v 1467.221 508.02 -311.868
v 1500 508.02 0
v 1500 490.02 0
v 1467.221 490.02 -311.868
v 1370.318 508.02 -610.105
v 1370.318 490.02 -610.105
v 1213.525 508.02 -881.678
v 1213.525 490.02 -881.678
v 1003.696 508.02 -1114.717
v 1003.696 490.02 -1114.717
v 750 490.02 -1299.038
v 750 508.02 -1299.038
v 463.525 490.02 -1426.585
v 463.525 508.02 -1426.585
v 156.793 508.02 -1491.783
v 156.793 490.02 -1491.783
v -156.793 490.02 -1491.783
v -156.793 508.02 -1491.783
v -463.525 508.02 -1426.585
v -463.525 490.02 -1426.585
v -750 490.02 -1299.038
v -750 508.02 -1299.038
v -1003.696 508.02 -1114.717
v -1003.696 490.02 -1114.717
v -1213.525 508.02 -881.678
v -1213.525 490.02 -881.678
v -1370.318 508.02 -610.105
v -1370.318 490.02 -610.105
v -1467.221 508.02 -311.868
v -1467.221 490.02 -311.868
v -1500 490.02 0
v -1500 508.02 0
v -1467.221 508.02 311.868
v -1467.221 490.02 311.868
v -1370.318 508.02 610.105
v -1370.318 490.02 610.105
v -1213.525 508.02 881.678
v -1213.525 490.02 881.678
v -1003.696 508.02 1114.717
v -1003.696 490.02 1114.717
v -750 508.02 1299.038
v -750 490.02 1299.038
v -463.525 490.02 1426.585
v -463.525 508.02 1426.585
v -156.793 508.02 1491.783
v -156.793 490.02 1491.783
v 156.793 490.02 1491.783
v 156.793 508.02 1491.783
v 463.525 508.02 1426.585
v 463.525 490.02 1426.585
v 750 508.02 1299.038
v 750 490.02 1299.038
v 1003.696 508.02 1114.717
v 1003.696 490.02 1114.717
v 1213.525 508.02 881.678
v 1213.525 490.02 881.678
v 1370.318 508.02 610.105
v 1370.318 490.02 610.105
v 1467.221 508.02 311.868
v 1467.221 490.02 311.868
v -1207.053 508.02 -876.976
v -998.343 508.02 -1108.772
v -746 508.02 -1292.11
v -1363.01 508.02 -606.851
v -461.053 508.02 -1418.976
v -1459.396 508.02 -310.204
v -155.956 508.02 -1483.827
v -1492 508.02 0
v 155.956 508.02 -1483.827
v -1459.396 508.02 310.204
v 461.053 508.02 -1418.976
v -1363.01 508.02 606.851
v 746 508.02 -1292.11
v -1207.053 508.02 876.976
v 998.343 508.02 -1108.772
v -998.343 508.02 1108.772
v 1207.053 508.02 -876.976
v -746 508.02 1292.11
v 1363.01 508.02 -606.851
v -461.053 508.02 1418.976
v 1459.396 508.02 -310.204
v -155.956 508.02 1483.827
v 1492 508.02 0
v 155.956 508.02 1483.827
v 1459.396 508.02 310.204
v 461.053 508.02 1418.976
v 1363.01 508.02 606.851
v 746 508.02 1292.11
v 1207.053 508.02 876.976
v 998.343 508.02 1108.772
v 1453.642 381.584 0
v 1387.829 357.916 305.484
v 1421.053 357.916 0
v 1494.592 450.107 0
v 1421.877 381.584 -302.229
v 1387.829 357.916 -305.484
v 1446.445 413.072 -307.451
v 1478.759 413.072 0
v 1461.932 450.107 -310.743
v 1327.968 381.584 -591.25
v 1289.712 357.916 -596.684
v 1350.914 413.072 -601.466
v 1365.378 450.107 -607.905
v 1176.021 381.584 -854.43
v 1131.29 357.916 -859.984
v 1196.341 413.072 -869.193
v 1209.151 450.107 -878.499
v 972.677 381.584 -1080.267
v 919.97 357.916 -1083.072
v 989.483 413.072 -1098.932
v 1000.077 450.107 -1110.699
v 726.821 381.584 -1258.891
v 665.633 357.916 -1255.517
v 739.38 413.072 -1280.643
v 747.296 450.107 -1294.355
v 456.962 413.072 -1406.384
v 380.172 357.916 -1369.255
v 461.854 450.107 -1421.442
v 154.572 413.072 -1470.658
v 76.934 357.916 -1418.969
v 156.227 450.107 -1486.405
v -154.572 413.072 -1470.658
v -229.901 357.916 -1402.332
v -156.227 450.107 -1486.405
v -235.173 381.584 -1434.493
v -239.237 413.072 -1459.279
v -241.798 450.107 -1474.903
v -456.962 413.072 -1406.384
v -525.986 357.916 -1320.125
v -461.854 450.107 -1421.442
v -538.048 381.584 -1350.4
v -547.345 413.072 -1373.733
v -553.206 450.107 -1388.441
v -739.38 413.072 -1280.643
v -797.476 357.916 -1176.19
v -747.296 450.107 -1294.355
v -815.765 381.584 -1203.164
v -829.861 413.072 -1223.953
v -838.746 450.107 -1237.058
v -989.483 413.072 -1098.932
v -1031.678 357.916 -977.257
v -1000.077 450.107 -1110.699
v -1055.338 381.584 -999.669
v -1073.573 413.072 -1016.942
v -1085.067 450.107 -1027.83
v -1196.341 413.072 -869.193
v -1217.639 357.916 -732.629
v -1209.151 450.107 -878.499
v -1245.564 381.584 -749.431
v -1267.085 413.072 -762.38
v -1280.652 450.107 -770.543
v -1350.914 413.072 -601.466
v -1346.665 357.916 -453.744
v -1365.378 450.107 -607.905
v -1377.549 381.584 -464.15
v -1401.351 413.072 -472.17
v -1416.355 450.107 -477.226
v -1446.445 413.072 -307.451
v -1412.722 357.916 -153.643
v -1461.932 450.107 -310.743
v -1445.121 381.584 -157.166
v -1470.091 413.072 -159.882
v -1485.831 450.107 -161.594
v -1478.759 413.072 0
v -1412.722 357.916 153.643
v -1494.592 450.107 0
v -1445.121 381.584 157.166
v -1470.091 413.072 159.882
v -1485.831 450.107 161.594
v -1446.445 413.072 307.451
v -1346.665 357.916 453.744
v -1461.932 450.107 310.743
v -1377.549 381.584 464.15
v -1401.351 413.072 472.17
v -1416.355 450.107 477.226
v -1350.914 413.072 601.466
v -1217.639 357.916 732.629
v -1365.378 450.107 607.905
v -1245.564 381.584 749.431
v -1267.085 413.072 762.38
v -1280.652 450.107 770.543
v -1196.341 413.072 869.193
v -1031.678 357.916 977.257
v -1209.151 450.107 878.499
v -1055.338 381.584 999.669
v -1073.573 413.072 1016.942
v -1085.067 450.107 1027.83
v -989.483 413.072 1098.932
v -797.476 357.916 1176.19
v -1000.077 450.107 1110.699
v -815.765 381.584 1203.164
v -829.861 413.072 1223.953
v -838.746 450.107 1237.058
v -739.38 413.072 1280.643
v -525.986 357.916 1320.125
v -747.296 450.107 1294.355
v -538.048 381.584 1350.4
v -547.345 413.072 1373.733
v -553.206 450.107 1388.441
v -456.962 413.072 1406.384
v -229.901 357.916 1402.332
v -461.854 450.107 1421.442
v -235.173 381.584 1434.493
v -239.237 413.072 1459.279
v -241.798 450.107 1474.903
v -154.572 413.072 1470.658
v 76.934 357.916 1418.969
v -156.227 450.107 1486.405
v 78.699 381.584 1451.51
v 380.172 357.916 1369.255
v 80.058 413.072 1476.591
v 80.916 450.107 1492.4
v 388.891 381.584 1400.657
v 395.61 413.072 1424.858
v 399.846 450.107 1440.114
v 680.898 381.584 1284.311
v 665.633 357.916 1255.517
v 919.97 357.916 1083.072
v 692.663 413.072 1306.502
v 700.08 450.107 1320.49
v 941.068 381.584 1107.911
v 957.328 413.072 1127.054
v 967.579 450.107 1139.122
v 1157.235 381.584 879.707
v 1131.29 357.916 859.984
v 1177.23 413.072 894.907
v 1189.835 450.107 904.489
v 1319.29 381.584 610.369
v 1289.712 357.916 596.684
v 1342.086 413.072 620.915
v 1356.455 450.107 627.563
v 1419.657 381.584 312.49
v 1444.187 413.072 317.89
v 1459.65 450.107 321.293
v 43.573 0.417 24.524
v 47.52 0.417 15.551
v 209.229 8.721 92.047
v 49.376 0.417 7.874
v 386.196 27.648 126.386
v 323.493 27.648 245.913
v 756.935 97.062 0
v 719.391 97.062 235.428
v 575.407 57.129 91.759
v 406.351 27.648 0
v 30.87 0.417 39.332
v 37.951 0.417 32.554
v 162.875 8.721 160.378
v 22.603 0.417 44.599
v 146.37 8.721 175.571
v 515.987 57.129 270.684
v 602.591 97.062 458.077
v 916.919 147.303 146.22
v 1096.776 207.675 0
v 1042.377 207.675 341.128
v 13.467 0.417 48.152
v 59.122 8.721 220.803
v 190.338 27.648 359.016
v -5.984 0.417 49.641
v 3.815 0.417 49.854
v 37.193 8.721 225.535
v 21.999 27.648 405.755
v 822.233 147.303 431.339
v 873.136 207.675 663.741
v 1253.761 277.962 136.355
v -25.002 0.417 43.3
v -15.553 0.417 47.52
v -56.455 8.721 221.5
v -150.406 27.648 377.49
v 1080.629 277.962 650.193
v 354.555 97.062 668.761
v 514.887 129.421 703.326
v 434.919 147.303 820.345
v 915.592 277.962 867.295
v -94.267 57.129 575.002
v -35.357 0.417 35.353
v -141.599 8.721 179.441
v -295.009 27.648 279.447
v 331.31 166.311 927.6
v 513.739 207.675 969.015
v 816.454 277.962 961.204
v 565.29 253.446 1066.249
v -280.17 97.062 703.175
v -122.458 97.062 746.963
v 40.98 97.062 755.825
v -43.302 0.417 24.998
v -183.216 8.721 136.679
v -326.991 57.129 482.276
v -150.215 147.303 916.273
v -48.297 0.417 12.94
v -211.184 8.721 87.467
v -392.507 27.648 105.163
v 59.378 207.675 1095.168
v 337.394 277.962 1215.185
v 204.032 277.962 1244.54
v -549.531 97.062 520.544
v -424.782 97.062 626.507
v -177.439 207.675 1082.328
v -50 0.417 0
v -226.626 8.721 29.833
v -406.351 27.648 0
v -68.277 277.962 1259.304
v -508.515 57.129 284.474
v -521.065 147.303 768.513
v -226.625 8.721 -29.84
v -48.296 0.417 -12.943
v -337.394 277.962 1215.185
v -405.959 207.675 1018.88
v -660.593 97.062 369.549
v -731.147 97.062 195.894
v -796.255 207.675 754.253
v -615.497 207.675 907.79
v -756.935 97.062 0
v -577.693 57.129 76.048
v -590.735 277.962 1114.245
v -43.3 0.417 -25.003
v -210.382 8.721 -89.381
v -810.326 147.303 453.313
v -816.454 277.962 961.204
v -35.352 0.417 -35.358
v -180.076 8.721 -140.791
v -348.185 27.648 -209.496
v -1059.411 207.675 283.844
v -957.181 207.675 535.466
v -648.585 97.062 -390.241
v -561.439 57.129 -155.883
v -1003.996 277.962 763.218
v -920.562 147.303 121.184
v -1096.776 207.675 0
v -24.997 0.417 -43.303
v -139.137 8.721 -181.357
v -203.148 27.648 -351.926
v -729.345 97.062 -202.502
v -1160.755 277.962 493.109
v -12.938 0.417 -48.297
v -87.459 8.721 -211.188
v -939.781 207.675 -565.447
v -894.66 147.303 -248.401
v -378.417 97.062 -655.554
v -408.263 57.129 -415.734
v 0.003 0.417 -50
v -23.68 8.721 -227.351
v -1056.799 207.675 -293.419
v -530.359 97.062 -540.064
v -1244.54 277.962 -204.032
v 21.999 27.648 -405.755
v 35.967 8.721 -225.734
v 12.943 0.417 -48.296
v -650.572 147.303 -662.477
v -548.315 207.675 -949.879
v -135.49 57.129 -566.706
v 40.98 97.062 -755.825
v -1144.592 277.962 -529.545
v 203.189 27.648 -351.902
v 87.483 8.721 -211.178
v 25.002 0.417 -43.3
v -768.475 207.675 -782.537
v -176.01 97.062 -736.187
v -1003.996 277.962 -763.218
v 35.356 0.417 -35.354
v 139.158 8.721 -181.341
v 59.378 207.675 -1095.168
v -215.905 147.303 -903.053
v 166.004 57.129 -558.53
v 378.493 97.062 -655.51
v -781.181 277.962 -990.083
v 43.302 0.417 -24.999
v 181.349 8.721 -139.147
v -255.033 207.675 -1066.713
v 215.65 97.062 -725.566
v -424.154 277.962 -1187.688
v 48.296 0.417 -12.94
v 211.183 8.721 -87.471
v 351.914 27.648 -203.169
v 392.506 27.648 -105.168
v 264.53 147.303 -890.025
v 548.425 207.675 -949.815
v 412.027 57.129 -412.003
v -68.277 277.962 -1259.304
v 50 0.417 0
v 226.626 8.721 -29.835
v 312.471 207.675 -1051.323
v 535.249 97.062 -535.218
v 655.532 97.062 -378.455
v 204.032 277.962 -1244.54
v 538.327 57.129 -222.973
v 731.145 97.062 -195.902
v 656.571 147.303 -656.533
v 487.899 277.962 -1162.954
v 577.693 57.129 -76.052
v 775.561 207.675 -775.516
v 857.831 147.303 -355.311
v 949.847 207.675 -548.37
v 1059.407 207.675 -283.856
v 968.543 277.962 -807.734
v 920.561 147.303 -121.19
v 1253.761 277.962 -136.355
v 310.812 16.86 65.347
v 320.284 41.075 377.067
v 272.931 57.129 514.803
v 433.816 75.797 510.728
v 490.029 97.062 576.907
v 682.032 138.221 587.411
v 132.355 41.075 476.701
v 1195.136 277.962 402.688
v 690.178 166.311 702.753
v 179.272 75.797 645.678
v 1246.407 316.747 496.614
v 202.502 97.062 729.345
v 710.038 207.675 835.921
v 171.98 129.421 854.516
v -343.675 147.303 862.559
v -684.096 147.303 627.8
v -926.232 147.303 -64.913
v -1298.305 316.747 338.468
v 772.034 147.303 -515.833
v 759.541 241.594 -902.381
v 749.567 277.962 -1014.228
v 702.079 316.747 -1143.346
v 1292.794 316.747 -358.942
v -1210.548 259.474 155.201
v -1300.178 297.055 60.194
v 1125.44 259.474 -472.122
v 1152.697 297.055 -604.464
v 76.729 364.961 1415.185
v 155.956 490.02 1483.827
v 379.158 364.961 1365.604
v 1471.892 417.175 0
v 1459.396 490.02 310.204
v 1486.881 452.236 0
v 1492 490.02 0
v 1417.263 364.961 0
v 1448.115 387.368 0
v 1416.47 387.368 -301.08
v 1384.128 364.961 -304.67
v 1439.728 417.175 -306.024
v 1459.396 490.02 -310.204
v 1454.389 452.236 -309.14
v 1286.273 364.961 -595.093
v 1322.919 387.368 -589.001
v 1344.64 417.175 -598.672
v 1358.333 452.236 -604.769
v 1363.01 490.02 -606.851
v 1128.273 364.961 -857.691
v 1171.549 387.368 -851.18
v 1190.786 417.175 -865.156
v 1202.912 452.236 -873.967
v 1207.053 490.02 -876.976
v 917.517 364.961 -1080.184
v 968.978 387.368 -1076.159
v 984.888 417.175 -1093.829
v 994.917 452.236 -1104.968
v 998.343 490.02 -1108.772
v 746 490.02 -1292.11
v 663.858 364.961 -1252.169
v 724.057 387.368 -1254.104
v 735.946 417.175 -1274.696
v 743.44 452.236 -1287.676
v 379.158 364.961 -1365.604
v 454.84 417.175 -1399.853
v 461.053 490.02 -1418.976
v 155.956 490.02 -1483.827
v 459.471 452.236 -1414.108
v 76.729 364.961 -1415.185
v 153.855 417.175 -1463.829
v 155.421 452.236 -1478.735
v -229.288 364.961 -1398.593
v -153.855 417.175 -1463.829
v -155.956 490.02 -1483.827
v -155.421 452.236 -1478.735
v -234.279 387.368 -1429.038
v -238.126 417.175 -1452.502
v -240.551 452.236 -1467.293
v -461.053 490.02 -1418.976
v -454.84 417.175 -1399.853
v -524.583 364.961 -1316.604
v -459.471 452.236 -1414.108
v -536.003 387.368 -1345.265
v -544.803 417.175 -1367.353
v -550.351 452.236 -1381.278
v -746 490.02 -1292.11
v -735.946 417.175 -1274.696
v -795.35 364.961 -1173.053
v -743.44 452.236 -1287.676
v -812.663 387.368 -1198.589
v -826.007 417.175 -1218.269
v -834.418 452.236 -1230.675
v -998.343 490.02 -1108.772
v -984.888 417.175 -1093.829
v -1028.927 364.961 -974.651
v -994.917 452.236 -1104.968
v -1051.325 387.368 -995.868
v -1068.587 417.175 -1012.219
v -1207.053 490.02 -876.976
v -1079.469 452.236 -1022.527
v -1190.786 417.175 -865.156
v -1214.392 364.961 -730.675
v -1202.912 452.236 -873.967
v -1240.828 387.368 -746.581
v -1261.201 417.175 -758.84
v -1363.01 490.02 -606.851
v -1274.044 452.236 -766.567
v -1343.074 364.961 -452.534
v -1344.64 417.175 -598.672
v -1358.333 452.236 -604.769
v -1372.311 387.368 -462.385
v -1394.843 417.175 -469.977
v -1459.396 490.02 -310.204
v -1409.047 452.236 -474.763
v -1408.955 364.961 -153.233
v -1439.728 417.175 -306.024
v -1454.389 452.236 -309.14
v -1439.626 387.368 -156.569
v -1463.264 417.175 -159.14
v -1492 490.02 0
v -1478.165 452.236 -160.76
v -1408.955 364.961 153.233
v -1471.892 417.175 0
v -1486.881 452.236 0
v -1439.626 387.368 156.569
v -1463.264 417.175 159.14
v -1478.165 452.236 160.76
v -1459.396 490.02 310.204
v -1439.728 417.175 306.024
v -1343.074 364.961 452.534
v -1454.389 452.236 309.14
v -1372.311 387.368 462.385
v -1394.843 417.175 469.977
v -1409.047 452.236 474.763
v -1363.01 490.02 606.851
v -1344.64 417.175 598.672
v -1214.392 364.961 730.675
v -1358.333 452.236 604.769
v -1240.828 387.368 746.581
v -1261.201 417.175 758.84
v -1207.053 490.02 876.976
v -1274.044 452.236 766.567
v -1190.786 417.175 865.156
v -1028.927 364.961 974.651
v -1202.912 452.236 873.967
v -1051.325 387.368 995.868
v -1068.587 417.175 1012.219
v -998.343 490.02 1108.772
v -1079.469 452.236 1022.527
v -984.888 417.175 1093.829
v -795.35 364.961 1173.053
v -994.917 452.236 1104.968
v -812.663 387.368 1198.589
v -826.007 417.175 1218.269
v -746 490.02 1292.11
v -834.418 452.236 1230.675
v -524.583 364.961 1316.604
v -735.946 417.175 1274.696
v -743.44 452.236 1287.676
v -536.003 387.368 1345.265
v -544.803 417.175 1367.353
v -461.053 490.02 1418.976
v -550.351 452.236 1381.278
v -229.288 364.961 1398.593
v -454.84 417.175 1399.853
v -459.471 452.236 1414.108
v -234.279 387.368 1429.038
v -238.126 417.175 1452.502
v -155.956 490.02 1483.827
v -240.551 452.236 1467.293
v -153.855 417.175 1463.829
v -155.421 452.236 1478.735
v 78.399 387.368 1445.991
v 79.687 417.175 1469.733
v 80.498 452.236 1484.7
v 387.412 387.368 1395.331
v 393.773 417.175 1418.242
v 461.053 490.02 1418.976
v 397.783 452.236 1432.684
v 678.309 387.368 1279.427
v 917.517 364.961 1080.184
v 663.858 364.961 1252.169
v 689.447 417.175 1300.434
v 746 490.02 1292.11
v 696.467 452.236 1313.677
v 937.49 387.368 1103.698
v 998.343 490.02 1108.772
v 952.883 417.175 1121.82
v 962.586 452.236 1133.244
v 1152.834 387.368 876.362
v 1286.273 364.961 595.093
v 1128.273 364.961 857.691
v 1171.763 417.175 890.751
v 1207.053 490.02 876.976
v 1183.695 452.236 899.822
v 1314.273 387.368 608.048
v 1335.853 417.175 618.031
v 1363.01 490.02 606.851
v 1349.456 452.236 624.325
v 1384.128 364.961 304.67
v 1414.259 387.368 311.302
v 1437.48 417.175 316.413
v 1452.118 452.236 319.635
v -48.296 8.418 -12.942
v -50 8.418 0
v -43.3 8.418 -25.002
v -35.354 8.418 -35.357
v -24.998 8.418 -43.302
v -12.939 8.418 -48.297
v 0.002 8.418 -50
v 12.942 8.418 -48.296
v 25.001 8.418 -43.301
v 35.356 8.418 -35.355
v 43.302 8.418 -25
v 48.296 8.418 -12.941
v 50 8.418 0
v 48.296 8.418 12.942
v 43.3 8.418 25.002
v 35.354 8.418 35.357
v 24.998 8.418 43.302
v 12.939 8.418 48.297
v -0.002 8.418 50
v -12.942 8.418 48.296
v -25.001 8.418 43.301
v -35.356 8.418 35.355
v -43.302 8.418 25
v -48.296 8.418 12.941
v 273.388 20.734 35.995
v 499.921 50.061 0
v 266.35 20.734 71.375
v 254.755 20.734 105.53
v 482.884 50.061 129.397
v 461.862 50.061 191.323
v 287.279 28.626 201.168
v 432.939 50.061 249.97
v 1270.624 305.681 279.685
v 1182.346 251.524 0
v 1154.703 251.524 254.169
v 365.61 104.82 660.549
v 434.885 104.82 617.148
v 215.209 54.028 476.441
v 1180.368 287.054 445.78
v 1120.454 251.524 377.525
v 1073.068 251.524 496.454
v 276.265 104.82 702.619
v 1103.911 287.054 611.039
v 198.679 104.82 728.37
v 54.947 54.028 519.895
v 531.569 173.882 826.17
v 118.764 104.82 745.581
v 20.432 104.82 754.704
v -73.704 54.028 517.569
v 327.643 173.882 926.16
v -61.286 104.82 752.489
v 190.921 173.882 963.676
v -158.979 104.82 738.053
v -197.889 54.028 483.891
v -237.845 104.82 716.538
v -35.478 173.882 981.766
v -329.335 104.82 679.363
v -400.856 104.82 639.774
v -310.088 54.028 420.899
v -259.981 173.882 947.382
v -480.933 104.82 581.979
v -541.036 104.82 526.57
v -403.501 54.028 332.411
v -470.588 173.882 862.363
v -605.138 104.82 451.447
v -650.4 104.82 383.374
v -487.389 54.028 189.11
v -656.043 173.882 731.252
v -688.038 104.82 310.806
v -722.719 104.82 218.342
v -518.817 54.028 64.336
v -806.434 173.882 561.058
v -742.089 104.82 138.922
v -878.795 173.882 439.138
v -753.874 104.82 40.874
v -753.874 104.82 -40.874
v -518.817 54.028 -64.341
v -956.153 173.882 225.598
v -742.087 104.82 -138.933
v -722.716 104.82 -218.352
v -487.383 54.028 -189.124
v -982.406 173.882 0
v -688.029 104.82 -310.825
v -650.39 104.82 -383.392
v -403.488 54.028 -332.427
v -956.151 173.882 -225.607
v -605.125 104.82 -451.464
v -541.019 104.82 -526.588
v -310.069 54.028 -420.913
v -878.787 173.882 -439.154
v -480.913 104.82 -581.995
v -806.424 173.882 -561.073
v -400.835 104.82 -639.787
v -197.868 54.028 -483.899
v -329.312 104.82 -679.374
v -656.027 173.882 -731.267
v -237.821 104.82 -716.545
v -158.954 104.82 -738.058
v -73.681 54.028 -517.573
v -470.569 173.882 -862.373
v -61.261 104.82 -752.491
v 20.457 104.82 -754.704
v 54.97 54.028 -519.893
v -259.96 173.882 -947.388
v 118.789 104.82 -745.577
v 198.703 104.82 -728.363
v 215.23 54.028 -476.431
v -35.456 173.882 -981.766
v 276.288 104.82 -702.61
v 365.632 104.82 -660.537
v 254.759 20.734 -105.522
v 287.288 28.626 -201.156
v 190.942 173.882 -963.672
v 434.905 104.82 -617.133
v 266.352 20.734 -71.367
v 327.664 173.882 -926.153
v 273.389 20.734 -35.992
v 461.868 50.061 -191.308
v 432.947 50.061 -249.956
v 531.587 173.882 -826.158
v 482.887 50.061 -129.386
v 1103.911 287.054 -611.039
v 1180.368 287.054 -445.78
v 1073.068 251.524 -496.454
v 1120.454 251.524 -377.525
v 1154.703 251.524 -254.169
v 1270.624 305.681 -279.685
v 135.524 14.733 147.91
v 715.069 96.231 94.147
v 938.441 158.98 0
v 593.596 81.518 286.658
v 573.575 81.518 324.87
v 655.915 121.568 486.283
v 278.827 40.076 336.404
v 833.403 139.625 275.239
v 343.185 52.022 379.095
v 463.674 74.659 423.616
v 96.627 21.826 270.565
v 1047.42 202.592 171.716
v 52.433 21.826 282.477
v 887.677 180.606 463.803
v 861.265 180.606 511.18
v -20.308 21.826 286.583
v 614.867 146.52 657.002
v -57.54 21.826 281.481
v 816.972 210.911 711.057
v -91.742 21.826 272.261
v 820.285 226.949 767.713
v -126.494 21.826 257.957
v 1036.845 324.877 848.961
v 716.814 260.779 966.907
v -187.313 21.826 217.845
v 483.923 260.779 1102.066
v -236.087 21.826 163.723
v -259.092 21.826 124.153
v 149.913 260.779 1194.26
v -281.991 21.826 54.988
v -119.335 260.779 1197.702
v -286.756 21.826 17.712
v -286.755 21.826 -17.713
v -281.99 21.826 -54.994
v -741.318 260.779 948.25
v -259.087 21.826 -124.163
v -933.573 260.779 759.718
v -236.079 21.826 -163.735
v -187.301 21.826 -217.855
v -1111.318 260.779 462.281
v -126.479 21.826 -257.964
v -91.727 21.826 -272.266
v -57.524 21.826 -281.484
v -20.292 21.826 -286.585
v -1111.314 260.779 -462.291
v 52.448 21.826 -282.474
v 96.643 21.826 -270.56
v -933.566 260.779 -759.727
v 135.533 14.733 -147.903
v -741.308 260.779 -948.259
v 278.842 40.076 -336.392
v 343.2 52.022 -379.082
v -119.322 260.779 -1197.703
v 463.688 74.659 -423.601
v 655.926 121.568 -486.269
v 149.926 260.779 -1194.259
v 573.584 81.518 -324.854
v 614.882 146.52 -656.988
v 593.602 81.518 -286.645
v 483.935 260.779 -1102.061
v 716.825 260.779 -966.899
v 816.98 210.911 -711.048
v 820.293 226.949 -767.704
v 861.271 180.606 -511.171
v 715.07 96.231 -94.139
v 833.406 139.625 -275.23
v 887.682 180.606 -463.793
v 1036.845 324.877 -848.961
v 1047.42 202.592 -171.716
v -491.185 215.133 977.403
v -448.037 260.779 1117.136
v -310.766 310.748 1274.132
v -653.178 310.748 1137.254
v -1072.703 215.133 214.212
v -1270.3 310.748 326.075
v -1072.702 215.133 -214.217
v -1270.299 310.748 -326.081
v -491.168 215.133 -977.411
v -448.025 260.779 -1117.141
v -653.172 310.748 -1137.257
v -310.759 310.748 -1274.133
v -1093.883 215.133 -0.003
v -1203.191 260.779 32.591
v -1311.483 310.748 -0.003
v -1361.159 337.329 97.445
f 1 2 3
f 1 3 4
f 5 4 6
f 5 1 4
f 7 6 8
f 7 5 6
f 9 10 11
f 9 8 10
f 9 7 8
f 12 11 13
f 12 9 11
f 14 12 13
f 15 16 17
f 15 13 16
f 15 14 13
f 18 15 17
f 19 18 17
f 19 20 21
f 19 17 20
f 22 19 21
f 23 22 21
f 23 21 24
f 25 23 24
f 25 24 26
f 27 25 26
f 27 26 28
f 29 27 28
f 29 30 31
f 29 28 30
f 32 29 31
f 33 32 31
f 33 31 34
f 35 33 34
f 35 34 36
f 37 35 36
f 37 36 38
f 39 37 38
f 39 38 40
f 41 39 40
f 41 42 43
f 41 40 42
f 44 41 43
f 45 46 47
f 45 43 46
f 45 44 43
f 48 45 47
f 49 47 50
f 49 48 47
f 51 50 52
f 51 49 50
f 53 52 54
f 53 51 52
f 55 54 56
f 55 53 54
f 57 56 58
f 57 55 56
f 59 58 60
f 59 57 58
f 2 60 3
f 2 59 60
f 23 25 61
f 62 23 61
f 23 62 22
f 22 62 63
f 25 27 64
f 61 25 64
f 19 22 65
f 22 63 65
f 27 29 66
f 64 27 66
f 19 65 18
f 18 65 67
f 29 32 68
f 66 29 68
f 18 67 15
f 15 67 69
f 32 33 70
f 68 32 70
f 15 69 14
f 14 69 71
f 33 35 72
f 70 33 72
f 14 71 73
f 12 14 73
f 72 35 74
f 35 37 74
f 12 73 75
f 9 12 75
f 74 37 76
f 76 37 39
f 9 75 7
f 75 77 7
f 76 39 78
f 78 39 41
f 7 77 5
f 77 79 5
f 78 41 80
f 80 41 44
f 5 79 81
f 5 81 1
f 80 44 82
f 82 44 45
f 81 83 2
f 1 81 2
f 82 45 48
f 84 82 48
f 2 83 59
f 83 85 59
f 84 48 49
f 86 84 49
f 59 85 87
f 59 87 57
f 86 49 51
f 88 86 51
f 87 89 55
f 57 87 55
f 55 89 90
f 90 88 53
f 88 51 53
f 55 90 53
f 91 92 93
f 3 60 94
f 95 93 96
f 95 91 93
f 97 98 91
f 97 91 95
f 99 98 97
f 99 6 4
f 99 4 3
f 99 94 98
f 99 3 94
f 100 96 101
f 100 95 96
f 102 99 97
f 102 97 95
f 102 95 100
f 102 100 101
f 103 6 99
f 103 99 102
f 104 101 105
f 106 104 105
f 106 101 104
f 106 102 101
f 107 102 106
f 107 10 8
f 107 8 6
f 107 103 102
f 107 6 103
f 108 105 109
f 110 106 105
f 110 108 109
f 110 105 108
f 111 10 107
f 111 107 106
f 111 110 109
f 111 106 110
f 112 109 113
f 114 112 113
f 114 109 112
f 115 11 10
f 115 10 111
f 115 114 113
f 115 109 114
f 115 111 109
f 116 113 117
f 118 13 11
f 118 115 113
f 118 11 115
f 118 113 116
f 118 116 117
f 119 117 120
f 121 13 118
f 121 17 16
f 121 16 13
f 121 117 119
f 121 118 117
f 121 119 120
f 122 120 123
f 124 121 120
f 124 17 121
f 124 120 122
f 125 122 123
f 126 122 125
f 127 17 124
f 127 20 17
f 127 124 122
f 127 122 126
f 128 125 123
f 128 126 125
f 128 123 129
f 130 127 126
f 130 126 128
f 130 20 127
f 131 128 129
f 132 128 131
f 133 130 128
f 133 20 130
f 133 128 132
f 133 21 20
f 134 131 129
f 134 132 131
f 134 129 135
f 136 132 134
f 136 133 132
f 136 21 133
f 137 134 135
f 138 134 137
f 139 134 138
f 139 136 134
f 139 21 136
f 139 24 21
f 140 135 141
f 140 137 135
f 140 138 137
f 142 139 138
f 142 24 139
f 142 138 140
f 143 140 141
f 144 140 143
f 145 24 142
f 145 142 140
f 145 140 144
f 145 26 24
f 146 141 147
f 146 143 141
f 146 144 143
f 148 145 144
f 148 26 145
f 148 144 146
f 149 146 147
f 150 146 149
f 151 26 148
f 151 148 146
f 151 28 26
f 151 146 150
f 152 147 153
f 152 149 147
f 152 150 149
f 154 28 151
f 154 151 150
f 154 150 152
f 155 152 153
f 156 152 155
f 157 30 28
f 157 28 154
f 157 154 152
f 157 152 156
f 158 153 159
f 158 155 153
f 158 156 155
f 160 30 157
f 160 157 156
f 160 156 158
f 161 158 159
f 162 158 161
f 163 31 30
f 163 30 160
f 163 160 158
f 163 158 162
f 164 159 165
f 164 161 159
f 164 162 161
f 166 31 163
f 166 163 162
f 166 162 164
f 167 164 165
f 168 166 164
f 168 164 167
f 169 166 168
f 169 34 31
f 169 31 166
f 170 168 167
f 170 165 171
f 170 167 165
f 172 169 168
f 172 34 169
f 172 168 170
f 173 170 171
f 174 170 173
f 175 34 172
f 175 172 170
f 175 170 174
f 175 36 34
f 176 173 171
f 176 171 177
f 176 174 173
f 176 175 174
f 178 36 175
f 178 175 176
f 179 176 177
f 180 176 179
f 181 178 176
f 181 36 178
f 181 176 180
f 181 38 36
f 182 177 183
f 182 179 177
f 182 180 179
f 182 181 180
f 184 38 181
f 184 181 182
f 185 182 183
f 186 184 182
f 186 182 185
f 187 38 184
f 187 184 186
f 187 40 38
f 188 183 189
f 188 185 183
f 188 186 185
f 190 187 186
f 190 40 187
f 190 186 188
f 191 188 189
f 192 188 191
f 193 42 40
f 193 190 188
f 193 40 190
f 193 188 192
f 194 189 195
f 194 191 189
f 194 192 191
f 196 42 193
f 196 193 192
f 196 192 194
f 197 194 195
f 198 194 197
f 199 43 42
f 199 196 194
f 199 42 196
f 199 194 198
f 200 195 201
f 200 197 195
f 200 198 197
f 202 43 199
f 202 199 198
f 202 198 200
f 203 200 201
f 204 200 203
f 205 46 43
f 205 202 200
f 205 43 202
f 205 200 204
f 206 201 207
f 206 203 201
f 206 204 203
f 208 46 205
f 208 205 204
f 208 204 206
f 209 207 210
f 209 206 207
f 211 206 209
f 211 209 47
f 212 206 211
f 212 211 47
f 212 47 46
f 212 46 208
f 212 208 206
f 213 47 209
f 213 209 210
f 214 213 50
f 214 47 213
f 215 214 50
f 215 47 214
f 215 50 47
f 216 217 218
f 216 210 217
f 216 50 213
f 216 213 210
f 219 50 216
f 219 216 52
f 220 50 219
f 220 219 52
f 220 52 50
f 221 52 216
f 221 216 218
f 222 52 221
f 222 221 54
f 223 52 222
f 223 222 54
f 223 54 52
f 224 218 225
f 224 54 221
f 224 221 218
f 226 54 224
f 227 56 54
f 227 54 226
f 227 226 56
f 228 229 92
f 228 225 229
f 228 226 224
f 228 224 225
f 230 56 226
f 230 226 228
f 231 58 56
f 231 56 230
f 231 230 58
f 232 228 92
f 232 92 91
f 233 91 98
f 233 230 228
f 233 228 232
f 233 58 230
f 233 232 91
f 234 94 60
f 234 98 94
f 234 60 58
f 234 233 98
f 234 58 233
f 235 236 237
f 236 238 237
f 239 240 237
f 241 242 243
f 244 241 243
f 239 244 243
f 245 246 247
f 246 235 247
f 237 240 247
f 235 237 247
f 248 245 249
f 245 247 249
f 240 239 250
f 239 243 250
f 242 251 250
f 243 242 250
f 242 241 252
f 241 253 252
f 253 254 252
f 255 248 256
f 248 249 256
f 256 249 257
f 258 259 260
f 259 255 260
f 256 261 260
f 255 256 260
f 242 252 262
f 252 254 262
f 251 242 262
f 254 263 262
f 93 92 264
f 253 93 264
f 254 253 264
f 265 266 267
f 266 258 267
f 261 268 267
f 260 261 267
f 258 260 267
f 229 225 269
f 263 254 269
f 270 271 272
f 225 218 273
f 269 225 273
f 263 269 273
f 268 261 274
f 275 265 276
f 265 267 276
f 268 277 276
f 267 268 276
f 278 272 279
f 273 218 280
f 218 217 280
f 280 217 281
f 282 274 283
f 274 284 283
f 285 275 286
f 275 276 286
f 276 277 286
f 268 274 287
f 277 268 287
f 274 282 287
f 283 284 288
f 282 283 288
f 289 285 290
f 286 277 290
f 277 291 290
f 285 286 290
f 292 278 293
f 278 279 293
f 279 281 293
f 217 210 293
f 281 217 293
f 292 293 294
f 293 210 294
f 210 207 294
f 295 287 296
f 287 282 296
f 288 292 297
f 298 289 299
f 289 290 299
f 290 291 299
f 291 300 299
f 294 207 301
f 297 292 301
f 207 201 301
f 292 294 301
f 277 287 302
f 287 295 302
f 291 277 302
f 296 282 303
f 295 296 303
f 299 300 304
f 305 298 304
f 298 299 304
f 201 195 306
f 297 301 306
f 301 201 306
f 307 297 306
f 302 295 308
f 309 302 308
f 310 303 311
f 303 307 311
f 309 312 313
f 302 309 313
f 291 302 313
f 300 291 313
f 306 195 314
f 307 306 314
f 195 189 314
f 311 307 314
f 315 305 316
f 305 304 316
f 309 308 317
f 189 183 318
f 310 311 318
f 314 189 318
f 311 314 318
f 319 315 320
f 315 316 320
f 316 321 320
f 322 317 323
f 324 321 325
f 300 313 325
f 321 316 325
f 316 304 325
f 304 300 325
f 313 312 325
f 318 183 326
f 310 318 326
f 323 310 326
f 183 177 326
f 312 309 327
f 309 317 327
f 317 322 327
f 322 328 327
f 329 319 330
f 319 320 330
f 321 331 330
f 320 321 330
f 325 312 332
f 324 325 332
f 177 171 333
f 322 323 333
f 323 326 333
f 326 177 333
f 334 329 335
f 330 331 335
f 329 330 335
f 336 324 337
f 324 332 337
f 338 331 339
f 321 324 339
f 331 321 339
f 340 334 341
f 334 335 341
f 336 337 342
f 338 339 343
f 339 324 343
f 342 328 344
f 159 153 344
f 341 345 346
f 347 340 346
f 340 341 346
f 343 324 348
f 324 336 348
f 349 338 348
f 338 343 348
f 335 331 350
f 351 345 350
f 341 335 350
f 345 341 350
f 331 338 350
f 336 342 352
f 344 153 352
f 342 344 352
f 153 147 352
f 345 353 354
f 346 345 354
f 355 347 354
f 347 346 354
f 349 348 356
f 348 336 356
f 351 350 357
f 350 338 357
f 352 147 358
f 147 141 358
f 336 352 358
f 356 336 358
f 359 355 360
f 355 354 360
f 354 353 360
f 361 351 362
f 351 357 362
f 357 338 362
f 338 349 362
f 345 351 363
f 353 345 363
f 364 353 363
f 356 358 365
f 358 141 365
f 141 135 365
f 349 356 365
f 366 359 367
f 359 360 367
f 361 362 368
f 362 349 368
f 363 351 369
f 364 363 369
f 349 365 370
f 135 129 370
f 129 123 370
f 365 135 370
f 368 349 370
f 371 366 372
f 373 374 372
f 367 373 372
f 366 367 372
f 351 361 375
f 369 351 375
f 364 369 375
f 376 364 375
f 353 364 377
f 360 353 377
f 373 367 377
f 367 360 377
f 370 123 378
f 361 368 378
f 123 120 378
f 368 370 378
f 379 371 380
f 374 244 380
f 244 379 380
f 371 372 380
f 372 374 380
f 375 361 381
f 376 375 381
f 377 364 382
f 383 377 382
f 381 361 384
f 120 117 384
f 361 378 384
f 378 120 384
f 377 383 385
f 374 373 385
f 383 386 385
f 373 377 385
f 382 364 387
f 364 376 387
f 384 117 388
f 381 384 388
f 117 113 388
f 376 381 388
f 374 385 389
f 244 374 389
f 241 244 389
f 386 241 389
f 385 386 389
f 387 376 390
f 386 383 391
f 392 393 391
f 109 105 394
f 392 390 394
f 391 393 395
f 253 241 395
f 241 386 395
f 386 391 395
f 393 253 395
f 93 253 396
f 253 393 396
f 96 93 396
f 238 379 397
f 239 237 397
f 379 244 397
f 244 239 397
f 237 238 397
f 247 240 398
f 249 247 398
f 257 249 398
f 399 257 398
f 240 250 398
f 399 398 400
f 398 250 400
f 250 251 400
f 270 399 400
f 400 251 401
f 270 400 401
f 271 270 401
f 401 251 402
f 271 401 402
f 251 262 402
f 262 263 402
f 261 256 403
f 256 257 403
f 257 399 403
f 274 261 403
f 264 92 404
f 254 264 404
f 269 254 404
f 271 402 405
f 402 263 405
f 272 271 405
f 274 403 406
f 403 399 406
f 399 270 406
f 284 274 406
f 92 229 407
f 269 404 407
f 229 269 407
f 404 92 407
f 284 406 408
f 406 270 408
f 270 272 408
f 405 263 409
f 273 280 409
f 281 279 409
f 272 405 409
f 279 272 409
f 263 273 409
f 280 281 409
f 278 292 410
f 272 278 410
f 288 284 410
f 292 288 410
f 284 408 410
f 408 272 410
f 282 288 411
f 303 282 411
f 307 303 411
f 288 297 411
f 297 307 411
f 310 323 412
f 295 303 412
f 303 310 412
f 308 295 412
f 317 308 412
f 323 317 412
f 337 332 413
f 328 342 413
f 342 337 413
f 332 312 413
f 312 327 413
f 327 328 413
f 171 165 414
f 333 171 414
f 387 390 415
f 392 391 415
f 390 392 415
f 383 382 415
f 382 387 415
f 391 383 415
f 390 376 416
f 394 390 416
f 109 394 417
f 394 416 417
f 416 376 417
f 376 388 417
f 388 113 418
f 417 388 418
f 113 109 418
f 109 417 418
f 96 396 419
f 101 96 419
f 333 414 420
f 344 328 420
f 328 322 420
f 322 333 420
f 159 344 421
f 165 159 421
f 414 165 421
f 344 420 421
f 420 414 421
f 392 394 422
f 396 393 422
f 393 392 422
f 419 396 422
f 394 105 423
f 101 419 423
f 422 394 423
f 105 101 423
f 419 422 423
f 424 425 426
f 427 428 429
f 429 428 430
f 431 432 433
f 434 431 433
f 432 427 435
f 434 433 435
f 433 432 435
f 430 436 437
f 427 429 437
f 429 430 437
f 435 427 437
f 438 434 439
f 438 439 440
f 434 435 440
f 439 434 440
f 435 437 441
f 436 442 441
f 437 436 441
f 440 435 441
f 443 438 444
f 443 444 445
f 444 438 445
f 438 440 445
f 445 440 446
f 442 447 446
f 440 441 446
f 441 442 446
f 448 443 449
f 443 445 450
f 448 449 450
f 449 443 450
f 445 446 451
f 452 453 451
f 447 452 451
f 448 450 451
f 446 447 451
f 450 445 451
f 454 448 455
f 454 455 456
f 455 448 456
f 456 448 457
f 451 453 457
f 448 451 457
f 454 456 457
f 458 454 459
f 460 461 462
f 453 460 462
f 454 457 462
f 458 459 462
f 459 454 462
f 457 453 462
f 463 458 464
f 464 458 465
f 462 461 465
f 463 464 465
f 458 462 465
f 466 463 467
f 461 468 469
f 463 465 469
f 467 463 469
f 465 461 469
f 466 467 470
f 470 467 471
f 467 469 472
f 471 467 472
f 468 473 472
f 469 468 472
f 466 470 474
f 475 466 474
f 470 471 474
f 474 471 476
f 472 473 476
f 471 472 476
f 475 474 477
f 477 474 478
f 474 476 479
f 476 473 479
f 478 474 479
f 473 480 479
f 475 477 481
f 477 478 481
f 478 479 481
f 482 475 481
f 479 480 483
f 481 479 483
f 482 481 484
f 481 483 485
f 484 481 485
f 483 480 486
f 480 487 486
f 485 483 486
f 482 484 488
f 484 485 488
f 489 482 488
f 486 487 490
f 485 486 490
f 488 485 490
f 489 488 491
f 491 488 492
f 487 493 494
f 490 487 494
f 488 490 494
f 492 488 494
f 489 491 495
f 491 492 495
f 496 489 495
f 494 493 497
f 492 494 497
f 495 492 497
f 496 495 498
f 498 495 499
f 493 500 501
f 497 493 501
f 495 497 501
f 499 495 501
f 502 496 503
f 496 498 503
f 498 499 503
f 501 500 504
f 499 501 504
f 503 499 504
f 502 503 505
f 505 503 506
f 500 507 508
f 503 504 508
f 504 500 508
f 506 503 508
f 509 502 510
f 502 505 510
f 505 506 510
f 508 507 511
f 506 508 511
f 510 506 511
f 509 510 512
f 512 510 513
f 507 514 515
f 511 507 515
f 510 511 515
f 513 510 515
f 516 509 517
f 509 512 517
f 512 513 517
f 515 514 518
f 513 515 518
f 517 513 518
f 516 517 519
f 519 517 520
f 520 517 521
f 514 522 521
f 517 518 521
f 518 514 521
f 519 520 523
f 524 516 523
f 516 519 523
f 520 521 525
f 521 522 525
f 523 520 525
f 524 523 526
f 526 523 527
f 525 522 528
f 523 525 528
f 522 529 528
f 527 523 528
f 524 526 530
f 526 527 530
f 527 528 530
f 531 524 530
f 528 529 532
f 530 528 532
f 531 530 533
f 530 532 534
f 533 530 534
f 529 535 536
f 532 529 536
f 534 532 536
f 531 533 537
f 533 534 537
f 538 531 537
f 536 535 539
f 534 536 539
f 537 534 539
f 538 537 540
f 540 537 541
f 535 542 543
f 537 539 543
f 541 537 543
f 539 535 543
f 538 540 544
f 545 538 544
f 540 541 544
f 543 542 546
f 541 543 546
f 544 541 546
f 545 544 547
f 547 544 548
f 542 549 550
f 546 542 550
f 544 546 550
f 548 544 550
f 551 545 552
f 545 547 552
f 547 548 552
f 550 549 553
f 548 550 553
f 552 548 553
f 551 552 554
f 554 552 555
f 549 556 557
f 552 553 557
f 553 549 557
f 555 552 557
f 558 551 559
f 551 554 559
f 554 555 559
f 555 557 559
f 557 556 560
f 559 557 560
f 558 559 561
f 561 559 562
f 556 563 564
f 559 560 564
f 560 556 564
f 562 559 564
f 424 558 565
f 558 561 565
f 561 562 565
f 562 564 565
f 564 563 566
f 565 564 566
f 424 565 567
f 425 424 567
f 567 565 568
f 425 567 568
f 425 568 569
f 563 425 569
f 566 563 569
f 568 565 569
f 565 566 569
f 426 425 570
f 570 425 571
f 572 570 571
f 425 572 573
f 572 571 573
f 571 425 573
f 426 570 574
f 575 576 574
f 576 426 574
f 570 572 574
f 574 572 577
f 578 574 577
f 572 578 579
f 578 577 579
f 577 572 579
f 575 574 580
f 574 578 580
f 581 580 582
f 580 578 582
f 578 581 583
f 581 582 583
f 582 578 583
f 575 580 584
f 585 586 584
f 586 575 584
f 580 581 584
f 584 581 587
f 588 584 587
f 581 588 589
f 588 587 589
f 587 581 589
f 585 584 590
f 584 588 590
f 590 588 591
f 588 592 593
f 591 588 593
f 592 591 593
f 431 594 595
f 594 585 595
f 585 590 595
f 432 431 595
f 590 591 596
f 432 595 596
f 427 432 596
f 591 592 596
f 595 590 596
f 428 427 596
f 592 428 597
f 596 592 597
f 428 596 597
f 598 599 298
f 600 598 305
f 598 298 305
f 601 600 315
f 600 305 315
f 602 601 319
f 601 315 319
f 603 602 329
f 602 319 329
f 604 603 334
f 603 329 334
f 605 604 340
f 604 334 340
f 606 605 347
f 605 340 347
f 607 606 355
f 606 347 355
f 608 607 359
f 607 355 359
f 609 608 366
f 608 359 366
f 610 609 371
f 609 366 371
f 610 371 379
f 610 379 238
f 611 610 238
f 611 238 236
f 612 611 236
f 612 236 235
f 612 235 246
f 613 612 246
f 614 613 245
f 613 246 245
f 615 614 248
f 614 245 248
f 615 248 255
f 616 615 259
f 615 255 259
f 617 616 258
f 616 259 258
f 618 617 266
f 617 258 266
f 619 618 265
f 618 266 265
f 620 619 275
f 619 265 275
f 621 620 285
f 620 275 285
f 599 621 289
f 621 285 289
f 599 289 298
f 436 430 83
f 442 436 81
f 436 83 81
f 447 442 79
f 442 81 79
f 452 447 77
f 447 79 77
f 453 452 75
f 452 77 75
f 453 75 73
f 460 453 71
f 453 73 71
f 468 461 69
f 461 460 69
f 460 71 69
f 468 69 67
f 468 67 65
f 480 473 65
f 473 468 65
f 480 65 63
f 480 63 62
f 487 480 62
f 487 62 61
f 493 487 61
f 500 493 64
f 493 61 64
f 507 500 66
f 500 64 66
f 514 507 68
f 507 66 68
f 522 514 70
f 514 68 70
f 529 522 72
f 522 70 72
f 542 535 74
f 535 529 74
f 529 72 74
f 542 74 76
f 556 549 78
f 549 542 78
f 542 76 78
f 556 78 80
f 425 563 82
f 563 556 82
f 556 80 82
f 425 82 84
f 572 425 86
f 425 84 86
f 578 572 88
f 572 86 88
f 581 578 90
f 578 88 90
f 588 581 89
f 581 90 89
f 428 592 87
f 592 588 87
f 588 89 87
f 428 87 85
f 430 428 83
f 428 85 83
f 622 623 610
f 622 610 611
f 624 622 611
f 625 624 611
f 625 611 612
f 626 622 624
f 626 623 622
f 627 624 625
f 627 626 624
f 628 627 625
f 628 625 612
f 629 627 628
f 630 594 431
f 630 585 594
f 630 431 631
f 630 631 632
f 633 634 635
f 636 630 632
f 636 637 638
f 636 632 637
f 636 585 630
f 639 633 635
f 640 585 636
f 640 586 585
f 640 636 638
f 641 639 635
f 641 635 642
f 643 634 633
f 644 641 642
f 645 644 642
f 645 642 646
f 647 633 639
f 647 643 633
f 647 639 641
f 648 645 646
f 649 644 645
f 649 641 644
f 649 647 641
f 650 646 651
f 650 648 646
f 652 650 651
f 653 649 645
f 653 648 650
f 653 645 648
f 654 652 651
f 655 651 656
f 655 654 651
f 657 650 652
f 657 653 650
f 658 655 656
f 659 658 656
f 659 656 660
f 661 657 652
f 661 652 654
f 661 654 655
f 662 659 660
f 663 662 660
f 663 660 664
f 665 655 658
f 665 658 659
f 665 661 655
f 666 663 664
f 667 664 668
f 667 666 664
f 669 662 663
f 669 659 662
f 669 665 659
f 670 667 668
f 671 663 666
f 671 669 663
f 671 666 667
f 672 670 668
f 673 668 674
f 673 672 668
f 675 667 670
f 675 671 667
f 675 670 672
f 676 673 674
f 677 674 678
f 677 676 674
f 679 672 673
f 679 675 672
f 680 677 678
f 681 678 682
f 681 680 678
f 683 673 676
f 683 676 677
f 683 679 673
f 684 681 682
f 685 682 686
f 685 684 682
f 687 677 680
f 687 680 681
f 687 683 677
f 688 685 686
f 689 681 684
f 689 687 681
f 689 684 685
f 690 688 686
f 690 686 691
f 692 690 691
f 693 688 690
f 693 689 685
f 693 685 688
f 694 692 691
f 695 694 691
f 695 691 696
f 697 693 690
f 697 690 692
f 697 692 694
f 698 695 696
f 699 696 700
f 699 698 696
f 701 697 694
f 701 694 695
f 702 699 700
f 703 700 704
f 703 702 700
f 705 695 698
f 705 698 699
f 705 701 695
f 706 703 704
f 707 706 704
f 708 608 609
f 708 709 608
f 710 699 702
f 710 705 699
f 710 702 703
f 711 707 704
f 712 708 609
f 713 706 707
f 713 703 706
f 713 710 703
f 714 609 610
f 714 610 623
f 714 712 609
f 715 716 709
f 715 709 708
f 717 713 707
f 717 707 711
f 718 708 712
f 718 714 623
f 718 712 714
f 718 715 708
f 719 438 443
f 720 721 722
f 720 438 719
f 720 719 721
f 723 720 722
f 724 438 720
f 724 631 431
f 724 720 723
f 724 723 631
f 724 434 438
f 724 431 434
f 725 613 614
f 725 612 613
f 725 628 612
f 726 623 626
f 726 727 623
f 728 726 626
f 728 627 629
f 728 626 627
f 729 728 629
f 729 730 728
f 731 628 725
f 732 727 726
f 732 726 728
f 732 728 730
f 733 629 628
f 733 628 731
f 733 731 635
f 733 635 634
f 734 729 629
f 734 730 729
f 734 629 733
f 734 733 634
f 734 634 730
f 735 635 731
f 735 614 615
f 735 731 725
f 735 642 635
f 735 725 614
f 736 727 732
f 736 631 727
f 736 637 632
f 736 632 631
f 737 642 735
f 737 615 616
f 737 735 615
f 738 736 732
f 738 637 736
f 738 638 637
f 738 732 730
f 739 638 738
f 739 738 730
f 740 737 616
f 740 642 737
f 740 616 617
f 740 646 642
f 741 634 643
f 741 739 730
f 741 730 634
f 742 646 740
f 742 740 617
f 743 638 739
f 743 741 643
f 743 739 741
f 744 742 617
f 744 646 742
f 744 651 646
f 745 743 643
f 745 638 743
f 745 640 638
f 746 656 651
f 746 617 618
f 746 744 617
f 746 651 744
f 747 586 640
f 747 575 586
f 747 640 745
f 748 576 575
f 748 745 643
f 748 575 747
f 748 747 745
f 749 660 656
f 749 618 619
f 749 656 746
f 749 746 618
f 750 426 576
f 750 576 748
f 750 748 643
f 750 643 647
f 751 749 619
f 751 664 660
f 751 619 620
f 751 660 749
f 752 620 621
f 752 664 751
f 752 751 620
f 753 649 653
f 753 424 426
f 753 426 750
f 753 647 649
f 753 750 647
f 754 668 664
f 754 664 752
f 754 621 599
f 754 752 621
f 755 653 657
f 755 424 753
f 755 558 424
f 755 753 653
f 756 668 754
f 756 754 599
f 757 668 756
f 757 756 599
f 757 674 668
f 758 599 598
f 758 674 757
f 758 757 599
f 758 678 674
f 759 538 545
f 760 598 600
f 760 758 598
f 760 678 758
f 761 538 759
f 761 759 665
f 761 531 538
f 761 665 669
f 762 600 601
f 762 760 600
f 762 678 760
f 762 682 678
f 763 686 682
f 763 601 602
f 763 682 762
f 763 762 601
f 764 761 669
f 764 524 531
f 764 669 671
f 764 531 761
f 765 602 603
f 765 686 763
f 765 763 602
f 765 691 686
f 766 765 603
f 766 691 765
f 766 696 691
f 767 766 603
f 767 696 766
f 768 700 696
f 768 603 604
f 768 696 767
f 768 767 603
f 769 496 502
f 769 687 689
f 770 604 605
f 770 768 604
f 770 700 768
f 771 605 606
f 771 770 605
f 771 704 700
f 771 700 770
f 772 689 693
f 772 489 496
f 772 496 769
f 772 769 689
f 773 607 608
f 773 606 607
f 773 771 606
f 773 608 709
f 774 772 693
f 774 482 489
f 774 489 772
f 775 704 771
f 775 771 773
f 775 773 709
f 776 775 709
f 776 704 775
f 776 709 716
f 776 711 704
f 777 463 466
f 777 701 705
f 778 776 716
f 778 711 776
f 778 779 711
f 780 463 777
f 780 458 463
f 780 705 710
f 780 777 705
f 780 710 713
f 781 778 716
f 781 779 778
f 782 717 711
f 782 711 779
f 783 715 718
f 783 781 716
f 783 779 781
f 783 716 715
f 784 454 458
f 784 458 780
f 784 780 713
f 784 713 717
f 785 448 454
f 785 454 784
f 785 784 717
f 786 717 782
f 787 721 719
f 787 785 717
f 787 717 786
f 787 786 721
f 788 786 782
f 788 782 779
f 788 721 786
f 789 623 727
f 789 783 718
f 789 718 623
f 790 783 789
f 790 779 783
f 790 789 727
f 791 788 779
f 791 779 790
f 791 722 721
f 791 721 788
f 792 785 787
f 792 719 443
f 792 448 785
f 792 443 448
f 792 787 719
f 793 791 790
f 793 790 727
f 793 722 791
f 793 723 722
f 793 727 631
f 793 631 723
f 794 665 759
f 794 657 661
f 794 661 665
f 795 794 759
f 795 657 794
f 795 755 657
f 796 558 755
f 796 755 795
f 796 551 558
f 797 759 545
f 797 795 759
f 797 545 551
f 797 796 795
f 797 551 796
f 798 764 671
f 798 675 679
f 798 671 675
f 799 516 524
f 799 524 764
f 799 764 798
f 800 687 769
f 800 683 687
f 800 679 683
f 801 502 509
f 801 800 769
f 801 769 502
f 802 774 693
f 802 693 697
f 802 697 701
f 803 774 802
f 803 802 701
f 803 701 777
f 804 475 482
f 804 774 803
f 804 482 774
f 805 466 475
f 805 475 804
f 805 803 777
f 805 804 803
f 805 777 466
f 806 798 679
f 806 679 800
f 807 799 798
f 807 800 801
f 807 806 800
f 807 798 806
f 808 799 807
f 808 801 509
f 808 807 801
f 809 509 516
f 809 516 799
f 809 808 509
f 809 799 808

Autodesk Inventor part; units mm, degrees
ref_plane "YZ Plane" through (0, 0, 0) normal (1, 0, 0) x (0, 1, 0)
ref_plane "XZ Plane" through (0, 0, 0) normal (0, 1, 0) x (-1, 0, 0)
ref_plane "XY Plane" through (0, 0, 0) normal (0, 0, 1) x (1, 0, 0)
sketch "Sketch1" plane through (0, 0, 0) normal (0, 0, 1) x (1, 0, 0)
  line L0 (-1421.0526, 357.9157) -> (1421.0526, 357.9157) construction
  arc A0 (-1421.0526, 357.9157) -> (0, 0) centre (0, 3000) ccw construction
  line L1 (-1500, 490.0199) -> (1500, 490.0199) construction
  arc A1 (-1500, 490.0199) -> (-1421.0526, 357.9157) centre (-1350, 490.0199) ccw construction
  arc A2 (1421.0526, 357.9157) -> (1500, 490.0199) centre (1350, 490.0199) ccw
  line L2 (-1500, 490.0199) -> (-1500, 508.0199)
  line L3 (1500, 490.0199) -> (1500, 508.0199)
  line L4 (-1500, 508.0199) -> (0, 508.0199) construction
  line L5 (0, 508.0199) -> (0, 0)
  arc A3 (0, 0) -> (1421.0526, 357.9157) centre (0, 3000) ccw
  line L6 (0, 508.0199) -> (1500, 508.0199)
  dimension "d0" = 3000
  dimension "d1" = 150
  dimension "d2" = 18
  dimension "d3" = 3000
  dimension "d7_from_floor" = 0
revolve "Revolution1" add sketch "Sketch1" angle 360 about axis through (0, 508.0199, 0) along (0, -1, 0)
shell "Shell1" thickness 8 removed faces 1 at (349.4466, 508.0199, 349.2864)
sketch "Sketch2" plane through (0, 0, 0) normal (0, 1, 0) x (-1, 0, 0)
  circle A0 centre (0, 0) radius 50
  dimension "d10" = 100
extrude "Extrusion1" cut sketch "Sketch2" along normal through all
equation "\"d0\" = d3"
equation "\"d3\" = MAIN_Filter_Diam"
equation "\"d10\" = MAIN_Outer_Tube_Diam"
equation "\"MAIN_Filter_Diam\" = 3000"
equation "\"MAIN_Outer_Tube_Diam\" = 100"
properties part number "dished head" material "Stainless Steel"
